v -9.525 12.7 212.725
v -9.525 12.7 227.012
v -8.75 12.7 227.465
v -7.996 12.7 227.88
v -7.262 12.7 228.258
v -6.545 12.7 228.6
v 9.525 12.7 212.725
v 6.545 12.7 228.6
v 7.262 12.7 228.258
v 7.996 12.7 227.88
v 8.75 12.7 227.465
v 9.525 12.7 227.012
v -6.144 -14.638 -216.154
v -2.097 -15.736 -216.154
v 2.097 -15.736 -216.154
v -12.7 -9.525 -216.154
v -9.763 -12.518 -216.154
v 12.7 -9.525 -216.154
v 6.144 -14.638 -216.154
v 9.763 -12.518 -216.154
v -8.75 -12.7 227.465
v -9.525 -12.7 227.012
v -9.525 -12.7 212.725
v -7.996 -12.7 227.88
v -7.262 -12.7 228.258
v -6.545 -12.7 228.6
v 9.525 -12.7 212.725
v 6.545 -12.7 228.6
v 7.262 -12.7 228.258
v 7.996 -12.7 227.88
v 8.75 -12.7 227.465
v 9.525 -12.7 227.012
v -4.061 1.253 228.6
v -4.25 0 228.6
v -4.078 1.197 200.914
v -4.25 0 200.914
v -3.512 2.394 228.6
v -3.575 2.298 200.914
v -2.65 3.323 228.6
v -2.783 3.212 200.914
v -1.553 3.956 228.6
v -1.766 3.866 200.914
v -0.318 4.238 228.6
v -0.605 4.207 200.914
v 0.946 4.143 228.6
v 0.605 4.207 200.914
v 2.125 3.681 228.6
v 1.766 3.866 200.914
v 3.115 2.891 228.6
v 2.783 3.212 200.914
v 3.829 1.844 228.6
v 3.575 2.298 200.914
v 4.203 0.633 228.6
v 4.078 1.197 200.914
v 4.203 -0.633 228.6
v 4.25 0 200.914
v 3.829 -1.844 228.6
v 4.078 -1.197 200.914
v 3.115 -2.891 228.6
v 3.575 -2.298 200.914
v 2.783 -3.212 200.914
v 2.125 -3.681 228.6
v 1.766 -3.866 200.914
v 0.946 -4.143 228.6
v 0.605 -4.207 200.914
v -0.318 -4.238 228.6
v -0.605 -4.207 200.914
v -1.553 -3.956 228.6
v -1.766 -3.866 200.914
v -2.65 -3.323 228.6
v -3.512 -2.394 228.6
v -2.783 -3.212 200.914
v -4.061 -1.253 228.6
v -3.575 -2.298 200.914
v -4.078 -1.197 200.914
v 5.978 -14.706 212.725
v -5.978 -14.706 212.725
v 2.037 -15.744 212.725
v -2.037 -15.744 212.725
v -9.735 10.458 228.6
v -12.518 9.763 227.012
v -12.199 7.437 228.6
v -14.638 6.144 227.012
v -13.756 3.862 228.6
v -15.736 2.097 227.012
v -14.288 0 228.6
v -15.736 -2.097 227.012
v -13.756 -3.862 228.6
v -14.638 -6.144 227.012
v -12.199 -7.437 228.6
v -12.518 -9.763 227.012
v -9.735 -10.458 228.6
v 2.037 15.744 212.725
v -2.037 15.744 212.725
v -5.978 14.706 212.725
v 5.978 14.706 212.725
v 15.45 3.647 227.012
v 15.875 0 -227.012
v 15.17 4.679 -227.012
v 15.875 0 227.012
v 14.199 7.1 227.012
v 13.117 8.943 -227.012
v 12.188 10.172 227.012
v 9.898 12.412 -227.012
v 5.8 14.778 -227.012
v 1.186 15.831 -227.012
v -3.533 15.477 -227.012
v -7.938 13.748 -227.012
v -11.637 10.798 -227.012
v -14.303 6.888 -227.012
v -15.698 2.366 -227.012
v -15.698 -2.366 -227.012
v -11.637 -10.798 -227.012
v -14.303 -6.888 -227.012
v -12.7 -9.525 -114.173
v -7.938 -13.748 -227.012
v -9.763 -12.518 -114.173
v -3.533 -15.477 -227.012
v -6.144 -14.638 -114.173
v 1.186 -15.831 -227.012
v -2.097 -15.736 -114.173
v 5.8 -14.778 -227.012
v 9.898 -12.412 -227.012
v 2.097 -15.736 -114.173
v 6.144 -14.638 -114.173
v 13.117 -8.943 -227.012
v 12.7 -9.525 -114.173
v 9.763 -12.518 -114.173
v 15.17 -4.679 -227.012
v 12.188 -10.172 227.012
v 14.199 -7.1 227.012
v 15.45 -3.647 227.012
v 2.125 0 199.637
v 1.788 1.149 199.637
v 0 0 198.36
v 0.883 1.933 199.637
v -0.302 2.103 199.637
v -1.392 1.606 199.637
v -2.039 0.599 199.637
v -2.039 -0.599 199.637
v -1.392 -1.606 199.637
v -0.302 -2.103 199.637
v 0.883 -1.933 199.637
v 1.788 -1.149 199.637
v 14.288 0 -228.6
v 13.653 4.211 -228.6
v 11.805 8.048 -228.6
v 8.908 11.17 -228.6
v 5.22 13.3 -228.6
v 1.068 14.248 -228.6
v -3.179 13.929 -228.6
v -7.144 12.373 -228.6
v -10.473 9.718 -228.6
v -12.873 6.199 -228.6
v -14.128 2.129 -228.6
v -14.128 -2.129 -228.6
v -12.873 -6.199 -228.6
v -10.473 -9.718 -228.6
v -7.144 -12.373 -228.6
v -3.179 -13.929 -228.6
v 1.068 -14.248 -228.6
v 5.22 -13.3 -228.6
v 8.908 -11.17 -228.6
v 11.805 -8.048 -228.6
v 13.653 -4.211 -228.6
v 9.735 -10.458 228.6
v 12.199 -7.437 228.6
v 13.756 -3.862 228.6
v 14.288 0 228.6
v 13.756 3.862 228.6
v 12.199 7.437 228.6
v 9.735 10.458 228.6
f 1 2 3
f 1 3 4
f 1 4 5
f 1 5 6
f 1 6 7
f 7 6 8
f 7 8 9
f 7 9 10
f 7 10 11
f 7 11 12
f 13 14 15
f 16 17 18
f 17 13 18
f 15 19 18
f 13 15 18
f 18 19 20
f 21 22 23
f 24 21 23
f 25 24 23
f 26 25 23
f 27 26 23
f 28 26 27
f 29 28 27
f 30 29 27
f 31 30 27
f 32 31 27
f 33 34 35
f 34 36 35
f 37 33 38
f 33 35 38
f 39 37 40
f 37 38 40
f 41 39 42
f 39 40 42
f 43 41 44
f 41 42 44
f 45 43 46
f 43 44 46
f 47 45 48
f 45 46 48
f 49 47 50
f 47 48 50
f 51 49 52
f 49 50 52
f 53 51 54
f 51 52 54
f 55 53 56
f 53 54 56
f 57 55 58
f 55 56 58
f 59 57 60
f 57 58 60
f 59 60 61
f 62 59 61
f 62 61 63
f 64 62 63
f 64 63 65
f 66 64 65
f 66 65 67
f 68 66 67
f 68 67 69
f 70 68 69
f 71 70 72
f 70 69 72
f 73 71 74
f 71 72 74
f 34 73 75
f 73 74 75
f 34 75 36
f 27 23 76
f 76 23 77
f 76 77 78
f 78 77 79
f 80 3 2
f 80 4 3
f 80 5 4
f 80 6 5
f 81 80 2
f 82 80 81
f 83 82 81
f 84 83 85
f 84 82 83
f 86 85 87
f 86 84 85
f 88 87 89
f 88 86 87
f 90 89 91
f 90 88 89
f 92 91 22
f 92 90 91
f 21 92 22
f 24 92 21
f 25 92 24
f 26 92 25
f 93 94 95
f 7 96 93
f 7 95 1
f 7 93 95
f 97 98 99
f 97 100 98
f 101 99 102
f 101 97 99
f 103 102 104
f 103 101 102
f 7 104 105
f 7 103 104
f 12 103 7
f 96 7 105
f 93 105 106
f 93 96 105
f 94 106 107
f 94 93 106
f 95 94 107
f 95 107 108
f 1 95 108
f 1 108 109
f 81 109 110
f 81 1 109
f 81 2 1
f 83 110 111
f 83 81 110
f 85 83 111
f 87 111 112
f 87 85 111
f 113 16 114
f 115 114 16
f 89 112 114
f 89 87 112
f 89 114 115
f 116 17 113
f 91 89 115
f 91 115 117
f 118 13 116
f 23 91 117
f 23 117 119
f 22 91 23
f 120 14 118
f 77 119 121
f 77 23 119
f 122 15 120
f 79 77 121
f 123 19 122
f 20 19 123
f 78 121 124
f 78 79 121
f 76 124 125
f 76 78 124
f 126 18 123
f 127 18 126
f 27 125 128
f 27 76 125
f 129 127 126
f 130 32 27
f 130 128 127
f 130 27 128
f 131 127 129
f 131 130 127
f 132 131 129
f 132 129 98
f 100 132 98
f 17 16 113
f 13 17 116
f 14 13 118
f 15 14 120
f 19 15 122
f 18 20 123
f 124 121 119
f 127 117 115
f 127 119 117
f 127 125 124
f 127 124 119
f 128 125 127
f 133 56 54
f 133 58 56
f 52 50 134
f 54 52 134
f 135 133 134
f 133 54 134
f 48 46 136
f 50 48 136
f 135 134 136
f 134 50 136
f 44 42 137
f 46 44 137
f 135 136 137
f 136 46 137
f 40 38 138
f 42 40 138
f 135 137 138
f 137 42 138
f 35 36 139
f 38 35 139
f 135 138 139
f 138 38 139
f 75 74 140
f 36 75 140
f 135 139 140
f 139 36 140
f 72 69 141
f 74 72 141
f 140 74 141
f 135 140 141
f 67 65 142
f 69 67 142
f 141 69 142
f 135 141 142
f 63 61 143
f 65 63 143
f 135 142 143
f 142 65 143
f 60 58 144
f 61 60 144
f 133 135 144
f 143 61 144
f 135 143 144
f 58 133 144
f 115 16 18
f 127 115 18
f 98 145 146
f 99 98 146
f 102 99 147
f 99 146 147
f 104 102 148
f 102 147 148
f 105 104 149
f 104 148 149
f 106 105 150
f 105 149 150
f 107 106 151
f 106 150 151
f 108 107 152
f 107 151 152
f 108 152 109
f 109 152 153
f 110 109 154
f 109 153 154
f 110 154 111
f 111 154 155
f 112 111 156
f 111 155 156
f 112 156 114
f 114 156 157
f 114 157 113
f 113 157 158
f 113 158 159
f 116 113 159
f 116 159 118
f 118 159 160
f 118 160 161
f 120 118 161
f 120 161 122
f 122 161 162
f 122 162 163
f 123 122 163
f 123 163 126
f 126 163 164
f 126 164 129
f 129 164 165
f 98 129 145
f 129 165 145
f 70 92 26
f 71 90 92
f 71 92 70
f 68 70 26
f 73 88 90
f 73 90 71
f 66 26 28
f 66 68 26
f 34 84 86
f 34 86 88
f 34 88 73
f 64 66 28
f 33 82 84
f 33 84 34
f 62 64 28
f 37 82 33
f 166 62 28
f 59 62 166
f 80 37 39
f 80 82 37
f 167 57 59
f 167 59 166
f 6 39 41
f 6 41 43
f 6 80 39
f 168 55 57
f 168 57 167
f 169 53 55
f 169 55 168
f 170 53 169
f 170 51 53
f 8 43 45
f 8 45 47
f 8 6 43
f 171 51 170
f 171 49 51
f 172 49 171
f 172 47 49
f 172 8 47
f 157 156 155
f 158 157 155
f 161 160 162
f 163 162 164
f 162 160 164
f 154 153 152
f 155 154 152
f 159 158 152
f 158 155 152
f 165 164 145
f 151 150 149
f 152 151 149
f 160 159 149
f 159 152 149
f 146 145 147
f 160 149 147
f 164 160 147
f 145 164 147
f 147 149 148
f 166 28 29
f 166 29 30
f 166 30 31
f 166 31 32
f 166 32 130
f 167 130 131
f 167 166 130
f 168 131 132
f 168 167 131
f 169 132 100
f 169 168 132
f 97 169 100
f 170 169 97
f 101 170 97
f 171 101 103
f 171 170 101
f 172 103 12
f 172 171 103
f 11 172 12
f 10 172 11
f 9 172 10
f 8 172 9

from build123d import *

# Parameters (mm, degrees)
SKETCH1_R                  = 15.875
BOSS_EXTRUDE1_DEPTH        = 228.6
SKETCH2_W                  = 50.8
SKETCH2_H                  = 101.981
CUT_EXTRUDE2_DEPTH         = 9.525
CHAMFER1_SIZE              = 1.5875
SKETCH3_W                  = 19.05
SKETCH3_H                  = 10.048588851
SKETCH3_H_2                = 8.582335087
CUT_EXTRUDE3_DEPTH         = 15.875
M10X1_5_TAPPED_HOLE1_D     = 8.5
M10X1_5_TAPPED_HOLE1_DEPTH = 27.686
M10X1_5_TAPPED_HOLE1_TIP   = 2.553657631


with BuildPart() as part:
    # Sketch1 → Boss-Extrude1 (new body, symmetric)
    with BuildSketch(Plane.XY):
        Circle(SKETCH1_R)
    extrude(amount=BOSS_EXTRUDE1_DEPTH, both=True)

    # Sketch2 → Cut-Extrude2 (cut)
    with BuildSketch(Plane(origin=(0, -19.05, 0), x_dir=(1, 0, 0), z_dir=(0, 1, 0))):
        with Locations((0, 165.1635)):
            Rectangle(SKETCH2_W, SKETCH2_H)
    extrude(amount=CUT_EXTRUDE2_DEPTH, mode=Mode.SUBTRACT)

    # Chamfer1
    chamfer1_edges = [part.edges().sort_by_distance(p)[0] for p in [
        (-15.875, 0, -228.6),
        (-15.875, 0, 228.6),
    ]]
    chamfer(chamfer1_edges, length=CHAMFER1_SIZE)

    # Sketch3 → Cut-Extrude3 (cut)
    with BuildSketch(Plane.XY.offset(228.6)):
        with Locations((0, 17.724294426)):
            Rectangle(SKETCH3_W, SKETCH3_H)
        with Locations((0, -16.991167544)):
            Rectangle(SKETCH3_W, SKETCH3_H_2)
    extrude(amount=-CUT_EXTRUDE3_DEPTH, mode=Mode.SUBTRACT)

    # M10x1.5 Tapped Hole1
    with Locations(Plane.XY.offset(228.6)):
        with Locations((0, 0)):
            Hole(M10X1_5_TAPPED_HOLE1_D / 2, depth=M10X1_5_TAPPED_HOLE1_DEPTH)
            with Locations((0, 0, -(M10X1_5_TAPPED_HOLE1_DEPTH + M10X1_5_TAPPED_HOLE1_TIP / 2))):  # 118° drill point
                Cone(0, M10X1_5_TAPPED_HOLE1_D / 2, M10X1_5_TAPPED_HOLE1_TIP, mode=Mode.SUBTRACT)


solid = part.part
